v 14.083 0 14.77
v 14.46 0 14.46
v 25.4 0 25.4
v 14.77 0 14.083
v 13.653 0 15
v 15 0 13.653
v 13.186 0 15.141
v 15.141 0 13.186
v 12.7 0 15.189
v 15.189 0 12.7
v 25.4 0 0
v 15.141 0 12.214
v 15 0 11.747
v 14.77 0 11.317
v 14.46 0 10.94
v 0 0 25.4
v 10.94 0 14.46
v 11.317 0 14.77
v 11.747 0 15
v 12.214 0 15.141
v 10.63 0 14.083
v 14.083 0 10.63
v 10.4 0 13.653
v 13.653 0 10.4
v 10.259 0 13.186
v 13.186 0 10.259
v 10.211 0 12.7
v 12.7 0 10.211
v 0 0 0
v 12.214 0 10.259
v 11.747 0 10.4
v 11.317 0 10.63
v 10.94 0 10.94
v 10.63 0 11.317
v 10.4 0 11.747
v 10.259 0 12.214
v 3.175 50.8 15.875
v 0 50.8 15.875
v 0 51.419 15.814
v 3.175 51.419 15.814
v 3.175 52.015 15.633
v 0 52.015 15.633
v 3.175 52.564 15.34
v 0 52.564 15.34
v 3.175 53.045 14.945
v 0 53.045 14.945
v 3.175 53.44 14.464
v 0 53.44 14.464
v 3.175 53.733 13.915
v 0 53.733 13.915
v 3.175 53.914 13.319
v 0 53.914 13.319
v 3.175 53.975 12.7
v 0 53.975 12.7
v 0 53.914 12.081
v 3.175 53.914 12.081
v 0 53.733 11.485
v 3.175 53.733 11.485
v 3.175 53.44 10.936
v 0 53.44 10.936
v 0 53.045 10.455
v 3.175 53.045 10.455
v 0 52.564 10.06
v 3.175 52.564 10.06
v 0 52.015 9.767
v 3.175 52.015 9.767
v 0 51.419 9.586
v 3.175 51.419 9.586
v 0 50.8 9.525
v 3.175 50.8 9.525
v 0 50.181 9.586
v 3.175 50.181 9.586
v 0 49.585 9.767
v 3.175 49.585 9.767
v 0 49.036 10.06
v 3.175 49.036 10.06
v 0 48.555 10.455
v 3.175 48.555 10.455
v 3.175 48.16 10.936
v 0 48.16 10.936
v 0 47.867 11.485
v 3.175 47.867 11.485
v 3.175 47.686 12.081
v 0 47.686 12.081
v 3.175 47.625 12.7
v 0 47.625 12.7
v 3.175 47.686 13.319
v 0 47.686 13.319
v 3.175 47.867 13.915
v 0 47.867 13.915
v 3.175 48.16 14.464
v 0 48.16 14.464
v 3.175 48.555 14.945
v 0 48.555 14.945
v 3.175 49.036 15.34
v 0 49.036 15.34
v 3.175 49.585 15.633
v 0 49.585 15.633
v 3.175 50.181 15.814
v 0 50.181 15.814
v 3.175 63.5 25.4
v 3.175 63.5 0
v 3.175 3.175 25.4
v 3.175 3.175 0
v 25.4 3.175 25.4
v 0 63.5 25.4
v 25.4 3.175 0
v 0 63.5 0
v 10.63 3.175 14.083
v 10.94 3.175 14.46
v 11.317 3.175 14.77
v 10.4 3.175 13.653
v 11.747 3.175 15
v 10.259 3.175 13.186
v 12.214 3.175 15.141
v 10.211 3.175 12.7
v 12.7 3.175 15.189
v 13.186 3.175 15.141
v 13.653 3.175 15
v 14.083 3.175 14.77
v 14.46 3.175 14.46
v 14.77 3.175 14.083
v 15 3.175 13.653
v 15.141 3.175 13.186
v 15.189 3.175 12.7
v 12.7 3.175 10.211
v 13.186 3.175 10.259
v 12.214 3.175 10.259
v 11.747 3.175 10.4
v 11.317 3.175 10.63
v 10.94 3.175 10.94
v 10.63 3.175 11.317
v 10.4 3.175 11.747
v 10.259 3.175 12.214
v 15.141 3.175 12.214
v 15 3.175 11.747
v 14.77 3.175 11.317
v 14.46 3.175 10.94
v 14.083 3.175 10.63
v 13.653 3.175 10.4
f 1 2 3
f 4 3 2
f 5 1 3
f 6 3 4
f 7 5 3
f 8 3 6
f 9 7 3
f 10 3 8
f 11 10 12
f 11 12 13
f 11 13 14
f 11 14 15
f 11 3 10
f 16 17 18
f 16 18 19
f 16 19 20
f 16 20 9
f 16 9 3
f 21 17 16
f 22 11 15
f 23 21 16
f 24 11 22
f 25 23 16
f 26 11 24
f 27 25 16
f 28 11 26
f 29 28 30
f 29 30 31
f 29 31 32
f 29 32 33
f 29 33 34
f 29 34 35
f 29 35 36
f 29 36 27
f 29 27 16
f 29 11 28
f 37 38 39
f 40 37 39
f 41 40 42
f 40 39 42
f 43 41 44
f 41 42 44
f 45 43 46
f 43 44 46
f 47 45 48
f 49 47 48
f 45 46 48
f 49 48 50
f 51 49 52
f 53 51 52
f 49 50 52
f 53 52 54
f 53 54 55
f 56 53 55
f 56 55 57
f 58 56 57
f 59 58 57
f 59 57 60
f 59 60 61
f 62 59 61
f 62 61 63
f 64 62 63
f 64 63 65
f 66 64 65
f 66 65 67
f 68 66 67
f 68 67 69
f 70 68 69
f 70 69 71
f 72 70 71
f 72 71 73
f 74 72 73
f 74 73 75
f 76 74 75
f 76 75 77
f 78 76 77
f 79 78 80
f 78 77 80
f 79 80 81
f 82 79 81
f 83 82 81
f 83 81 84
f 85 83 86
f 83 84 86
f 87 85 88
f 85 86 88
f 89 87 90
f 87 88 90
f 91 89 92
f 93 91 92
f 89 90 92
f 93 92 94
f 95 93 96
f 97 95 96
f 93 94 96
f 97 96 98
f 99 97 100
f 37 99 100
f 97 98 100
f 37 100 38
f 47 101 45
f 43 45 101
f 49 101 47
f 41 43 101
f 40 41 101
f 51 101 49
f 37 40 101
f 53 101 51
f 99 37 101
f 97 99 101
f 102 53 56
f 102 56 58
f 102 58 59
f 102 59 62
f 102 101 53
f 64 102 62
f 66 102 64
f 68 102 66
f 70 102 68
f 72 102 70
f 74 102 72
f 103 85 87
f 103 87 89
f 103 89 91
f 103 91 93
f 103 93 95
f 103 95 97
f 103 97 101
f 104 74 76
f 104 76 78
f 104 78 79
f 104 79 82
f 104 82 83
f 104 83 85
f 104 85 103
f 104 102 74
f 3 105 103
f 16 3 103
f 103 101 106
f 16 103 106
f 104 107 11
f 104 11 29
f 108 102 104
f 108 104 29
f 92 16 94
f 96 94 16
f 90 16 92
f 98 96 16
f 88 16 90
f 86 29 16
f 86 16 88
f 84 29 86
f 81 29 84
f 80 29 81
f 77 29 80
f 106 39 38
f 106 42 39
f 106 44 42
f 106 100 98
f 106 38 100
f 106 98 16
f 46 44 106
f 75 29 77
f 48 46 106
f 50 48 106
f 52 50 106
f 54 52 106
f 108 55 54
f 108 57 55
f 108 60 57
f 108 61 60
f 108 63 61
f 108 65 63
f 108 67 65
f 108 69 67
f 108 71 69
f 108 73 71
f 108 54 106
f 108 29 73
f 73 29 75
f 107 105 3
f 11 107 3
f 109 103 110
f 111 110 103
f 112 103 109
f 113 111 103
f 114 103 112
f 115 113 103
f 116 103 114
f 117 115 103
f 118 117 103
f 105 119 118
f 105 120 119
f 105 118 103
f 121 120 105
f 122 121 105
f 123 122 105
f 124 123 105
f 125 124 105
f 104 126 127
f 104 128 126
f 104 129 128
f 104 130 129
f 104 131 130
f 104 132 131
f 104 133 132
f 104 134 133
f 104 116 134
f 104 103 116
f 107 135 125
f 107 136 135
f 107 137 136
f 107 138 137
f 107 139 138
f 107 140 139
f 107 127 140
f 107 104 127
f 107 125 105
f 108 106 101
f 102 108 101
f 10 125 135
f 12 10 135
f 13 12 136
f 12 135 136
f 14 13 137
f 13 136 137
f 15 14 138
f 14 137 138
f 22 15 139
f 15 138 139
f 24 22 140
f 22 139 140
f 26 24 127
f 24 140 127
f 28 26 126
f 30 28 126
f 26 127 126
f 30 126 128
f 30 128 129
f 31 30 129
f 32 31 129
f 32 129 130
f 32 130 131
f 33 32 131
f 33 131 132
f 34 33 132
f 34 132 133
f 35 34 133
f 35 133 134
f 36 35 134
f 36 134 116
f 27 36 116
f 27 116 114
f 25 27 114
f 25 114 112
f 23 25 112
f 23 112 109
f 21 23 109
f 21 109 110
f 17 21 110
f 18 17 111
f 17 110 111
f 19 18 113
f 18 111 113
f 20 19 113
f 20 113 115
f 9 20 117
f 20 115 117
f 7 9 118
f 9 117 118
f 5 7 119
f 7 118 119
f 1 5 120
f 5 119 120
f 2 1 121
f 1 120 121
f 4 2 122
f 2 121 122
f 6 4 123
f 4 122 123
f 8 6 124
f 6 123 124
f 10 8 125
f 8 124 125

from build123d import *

# Parameters (mm, degrees)
BOSS_EXTRUDE1_DEPTH            = 25.4
SKETCH2_R                      = 3.175
CUT_EXTRUDE1_DEPTH             = 26.4
F_9_0_196_DIAMETER_HOLE1_D     = 4.9784
F_9_0_196_DIAMETER_HOLE1_DEPTH = 3.175


with BuildPart() as part:
    # Sketch1 → Boss-Extrude1 (new body)
    with BuildSketch(Plane.XY):
        Polygon((0, 0), (0, 63.5), (3.175, 63.5), (3.175, 3.175), (25.4, 3.175), (25.4, 0), align=None)
    extrude(amount=BOSS_EXTRUDE1_DEPTH)

    # Sketch2 → Cut-Extrude1 (cut, through all)
    with BuildSketch(Plane.ZY):
        with Locations((12.7, 50.8)):
            Circle(SKETCH2_R)
    extrude(amount=-CUT_EXTRUDE1_DEPTH, mode=Mode.SUBTRACT)

    # #9 (0.196) Diameter Hole1
    with Locations(Plane(origin=(0, 0, 0), x_dir=(-1, 0, 0), z_dir=(0, -1, 0))):
        with Locations((-12.7, -12.7)):
            Hole(F_9_0_196_DIAMETER_HOLE1_D / 2, depth=F_9_0_196_DIAMETER_HOLE1_DEPTH)


solid = part.part
